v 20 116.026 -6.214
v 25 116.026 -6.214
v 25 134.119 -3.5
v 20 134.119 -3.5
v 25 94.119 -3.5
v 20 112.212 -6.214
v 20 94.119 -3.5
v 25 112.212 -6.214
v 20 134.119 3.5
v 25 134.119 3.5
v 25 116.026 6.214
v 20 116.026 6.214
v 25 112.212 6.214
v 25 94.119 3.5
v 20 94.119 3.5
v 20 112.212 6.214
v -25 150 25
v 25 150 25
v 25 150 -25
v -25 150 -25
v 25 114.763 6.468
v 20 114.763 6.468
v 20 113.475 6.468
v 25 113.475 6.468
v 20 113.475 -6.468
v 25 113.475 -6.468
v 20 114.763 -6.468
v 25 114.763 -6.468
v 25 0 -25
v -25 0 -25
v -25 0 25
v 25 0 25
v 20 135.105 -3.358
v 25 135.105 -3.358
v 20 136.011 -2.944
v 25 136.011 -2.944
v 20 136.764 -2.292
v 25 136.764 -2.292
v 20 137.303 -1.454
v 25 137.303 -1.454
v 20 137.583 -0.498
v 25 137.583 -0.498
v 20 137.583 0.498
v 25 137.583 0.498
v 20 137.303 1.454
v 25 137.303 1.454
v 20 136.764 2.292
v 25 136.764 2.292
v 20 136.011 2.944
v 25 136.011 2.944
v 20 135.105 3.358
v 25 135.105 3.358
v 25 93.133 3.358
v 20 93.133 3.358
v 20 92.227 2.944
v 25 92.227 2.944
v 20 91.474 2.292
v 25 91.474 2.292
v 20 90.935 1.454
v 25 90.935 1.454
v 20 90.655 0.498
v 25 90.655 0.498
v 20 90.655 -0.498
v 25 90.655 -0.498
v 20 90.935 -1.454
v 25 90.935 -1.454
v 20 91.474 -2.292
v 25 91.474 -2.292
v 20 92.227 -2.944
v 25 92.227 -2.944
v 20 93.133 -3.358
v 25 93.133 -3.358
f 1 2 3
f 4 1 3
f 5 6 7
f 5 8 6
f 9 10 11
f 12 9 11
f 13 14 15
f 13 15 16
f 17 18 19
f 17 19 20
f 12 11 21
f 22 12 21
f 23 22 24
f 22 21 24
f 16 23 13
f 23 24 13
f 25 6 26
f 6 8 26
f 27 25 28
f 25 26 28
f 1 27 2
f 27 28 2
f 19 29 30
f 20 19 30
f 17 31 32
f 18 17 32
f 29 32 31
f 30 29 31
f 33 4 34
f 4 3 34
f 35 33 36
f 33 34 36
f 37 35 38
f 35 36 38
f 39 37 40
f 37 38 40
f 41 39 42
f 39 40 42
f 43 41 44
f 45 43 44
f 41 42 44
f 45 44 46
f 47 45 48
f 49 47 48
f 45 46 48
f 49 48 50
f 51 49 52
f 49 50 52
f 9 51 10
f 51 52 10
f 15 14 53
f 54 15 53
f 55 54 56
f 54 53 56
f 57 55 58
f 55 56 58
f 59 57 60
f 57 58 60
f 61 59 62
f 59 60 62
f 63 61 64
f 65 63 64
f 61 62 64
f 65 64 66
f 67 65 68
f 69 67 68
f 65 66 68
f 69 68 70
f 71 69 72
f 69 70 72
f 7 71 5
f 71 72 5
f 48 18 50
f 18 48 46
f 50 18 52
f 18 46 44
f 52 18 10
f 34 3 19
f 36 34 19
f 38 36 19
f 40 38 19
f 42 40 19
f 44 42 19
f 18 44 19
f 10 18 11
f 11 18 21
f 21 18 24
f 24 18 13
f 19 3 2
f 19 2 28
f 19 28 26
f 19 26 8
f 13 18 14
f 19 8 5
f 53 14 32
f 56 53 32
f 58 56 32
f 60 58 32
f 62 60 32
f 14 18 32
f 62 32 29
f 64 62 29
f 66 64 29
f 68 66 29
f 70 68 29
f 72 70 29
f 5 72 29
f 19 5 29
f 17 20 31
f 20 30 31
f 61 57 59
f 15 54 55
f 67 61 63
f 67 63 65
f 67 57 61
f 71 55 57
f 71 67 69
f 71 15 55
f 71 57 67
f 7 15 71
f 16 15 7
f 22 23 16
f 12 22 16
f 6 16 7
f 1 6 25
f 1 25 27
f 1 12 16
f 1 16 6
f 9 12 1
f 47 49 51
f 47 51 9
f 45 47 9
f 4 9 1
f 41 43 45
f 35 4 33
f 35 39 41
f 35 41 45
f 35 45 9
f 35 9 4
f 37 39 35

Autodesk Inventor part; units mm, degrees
ref_plane "YZ Plane" through (0, 0, 0) normal (1, 0, 0) x (0, 1, 0)
ref_plane "XZ Plane" through (0, 0, 0) normal (0, 1, 0) x (-1, 0, 0)
ref_plane "XY Plane" through (0, 0, 0) normal (0, 0, 1) x (1, 0, 0)
sketch "Sketch1" plane through (0, 0, 0) normal (0, 1, 0) x (-1, 0, 0)
  line L0 (25, 25) -> (-25, 25)
  line L1 (-25, 25) -> (-25, -25)
  line L2 (-25, -25) -> (25, -25)
  line L3 (25, -25) -> (25, 25)
  line L4 (25, 25) -> (-25, -25) construction
  line L5 (-25, 25) -> (25, -25) construction
  point P0 (0, 0)
  dimension "d0" = 50
  dimension "d1" = 50
extrude "Extrusion1" add sketch "Sketch1" along normal blind 150
sketch "Sketch2" plane through (25, 0, 25) normal (1, 0, 0) x (0, 0, -1)
  arc A0 (28.5, 134.119) -> (21.5, 134.119) centre (25, 134.119) ccw
  line L0 (31.2139, 116.0261) -> (28.5, 134.119)
  line L1 (21.5, 134.119) -> (18.7861, 116.0261)
  line L2 (25, 114.119) -> (27.6706, 114.119)
  arc A1 (21.5, 94.119) -> (28.5, 94.119) centre (25, 94.119) ccw
  line L3 (31.2139, 112.2119) -> (28.5, 94.119)
  line L4 (21.5, 94.119) -> (18.7861, 112.2119)
  arc A2 (18.7861, 116.0261) -> (18.7861, 112.2119) centre (25, 114.119) ccw
  arc A3 (31.2139, 112.2119) -> (31.2139, 116.0261) centre (25, 114.119) ccw
  point P0 (25, 0)
  point P1 (31.5, 114.119)
  point P2 (18.5, 114.119)
  dimension "d5" = 7
  dimension "d6" = 20
extrude "Extrusion2" cut sketch "Sketch2" against normal blind 5
properties part number "tangan kanan"
